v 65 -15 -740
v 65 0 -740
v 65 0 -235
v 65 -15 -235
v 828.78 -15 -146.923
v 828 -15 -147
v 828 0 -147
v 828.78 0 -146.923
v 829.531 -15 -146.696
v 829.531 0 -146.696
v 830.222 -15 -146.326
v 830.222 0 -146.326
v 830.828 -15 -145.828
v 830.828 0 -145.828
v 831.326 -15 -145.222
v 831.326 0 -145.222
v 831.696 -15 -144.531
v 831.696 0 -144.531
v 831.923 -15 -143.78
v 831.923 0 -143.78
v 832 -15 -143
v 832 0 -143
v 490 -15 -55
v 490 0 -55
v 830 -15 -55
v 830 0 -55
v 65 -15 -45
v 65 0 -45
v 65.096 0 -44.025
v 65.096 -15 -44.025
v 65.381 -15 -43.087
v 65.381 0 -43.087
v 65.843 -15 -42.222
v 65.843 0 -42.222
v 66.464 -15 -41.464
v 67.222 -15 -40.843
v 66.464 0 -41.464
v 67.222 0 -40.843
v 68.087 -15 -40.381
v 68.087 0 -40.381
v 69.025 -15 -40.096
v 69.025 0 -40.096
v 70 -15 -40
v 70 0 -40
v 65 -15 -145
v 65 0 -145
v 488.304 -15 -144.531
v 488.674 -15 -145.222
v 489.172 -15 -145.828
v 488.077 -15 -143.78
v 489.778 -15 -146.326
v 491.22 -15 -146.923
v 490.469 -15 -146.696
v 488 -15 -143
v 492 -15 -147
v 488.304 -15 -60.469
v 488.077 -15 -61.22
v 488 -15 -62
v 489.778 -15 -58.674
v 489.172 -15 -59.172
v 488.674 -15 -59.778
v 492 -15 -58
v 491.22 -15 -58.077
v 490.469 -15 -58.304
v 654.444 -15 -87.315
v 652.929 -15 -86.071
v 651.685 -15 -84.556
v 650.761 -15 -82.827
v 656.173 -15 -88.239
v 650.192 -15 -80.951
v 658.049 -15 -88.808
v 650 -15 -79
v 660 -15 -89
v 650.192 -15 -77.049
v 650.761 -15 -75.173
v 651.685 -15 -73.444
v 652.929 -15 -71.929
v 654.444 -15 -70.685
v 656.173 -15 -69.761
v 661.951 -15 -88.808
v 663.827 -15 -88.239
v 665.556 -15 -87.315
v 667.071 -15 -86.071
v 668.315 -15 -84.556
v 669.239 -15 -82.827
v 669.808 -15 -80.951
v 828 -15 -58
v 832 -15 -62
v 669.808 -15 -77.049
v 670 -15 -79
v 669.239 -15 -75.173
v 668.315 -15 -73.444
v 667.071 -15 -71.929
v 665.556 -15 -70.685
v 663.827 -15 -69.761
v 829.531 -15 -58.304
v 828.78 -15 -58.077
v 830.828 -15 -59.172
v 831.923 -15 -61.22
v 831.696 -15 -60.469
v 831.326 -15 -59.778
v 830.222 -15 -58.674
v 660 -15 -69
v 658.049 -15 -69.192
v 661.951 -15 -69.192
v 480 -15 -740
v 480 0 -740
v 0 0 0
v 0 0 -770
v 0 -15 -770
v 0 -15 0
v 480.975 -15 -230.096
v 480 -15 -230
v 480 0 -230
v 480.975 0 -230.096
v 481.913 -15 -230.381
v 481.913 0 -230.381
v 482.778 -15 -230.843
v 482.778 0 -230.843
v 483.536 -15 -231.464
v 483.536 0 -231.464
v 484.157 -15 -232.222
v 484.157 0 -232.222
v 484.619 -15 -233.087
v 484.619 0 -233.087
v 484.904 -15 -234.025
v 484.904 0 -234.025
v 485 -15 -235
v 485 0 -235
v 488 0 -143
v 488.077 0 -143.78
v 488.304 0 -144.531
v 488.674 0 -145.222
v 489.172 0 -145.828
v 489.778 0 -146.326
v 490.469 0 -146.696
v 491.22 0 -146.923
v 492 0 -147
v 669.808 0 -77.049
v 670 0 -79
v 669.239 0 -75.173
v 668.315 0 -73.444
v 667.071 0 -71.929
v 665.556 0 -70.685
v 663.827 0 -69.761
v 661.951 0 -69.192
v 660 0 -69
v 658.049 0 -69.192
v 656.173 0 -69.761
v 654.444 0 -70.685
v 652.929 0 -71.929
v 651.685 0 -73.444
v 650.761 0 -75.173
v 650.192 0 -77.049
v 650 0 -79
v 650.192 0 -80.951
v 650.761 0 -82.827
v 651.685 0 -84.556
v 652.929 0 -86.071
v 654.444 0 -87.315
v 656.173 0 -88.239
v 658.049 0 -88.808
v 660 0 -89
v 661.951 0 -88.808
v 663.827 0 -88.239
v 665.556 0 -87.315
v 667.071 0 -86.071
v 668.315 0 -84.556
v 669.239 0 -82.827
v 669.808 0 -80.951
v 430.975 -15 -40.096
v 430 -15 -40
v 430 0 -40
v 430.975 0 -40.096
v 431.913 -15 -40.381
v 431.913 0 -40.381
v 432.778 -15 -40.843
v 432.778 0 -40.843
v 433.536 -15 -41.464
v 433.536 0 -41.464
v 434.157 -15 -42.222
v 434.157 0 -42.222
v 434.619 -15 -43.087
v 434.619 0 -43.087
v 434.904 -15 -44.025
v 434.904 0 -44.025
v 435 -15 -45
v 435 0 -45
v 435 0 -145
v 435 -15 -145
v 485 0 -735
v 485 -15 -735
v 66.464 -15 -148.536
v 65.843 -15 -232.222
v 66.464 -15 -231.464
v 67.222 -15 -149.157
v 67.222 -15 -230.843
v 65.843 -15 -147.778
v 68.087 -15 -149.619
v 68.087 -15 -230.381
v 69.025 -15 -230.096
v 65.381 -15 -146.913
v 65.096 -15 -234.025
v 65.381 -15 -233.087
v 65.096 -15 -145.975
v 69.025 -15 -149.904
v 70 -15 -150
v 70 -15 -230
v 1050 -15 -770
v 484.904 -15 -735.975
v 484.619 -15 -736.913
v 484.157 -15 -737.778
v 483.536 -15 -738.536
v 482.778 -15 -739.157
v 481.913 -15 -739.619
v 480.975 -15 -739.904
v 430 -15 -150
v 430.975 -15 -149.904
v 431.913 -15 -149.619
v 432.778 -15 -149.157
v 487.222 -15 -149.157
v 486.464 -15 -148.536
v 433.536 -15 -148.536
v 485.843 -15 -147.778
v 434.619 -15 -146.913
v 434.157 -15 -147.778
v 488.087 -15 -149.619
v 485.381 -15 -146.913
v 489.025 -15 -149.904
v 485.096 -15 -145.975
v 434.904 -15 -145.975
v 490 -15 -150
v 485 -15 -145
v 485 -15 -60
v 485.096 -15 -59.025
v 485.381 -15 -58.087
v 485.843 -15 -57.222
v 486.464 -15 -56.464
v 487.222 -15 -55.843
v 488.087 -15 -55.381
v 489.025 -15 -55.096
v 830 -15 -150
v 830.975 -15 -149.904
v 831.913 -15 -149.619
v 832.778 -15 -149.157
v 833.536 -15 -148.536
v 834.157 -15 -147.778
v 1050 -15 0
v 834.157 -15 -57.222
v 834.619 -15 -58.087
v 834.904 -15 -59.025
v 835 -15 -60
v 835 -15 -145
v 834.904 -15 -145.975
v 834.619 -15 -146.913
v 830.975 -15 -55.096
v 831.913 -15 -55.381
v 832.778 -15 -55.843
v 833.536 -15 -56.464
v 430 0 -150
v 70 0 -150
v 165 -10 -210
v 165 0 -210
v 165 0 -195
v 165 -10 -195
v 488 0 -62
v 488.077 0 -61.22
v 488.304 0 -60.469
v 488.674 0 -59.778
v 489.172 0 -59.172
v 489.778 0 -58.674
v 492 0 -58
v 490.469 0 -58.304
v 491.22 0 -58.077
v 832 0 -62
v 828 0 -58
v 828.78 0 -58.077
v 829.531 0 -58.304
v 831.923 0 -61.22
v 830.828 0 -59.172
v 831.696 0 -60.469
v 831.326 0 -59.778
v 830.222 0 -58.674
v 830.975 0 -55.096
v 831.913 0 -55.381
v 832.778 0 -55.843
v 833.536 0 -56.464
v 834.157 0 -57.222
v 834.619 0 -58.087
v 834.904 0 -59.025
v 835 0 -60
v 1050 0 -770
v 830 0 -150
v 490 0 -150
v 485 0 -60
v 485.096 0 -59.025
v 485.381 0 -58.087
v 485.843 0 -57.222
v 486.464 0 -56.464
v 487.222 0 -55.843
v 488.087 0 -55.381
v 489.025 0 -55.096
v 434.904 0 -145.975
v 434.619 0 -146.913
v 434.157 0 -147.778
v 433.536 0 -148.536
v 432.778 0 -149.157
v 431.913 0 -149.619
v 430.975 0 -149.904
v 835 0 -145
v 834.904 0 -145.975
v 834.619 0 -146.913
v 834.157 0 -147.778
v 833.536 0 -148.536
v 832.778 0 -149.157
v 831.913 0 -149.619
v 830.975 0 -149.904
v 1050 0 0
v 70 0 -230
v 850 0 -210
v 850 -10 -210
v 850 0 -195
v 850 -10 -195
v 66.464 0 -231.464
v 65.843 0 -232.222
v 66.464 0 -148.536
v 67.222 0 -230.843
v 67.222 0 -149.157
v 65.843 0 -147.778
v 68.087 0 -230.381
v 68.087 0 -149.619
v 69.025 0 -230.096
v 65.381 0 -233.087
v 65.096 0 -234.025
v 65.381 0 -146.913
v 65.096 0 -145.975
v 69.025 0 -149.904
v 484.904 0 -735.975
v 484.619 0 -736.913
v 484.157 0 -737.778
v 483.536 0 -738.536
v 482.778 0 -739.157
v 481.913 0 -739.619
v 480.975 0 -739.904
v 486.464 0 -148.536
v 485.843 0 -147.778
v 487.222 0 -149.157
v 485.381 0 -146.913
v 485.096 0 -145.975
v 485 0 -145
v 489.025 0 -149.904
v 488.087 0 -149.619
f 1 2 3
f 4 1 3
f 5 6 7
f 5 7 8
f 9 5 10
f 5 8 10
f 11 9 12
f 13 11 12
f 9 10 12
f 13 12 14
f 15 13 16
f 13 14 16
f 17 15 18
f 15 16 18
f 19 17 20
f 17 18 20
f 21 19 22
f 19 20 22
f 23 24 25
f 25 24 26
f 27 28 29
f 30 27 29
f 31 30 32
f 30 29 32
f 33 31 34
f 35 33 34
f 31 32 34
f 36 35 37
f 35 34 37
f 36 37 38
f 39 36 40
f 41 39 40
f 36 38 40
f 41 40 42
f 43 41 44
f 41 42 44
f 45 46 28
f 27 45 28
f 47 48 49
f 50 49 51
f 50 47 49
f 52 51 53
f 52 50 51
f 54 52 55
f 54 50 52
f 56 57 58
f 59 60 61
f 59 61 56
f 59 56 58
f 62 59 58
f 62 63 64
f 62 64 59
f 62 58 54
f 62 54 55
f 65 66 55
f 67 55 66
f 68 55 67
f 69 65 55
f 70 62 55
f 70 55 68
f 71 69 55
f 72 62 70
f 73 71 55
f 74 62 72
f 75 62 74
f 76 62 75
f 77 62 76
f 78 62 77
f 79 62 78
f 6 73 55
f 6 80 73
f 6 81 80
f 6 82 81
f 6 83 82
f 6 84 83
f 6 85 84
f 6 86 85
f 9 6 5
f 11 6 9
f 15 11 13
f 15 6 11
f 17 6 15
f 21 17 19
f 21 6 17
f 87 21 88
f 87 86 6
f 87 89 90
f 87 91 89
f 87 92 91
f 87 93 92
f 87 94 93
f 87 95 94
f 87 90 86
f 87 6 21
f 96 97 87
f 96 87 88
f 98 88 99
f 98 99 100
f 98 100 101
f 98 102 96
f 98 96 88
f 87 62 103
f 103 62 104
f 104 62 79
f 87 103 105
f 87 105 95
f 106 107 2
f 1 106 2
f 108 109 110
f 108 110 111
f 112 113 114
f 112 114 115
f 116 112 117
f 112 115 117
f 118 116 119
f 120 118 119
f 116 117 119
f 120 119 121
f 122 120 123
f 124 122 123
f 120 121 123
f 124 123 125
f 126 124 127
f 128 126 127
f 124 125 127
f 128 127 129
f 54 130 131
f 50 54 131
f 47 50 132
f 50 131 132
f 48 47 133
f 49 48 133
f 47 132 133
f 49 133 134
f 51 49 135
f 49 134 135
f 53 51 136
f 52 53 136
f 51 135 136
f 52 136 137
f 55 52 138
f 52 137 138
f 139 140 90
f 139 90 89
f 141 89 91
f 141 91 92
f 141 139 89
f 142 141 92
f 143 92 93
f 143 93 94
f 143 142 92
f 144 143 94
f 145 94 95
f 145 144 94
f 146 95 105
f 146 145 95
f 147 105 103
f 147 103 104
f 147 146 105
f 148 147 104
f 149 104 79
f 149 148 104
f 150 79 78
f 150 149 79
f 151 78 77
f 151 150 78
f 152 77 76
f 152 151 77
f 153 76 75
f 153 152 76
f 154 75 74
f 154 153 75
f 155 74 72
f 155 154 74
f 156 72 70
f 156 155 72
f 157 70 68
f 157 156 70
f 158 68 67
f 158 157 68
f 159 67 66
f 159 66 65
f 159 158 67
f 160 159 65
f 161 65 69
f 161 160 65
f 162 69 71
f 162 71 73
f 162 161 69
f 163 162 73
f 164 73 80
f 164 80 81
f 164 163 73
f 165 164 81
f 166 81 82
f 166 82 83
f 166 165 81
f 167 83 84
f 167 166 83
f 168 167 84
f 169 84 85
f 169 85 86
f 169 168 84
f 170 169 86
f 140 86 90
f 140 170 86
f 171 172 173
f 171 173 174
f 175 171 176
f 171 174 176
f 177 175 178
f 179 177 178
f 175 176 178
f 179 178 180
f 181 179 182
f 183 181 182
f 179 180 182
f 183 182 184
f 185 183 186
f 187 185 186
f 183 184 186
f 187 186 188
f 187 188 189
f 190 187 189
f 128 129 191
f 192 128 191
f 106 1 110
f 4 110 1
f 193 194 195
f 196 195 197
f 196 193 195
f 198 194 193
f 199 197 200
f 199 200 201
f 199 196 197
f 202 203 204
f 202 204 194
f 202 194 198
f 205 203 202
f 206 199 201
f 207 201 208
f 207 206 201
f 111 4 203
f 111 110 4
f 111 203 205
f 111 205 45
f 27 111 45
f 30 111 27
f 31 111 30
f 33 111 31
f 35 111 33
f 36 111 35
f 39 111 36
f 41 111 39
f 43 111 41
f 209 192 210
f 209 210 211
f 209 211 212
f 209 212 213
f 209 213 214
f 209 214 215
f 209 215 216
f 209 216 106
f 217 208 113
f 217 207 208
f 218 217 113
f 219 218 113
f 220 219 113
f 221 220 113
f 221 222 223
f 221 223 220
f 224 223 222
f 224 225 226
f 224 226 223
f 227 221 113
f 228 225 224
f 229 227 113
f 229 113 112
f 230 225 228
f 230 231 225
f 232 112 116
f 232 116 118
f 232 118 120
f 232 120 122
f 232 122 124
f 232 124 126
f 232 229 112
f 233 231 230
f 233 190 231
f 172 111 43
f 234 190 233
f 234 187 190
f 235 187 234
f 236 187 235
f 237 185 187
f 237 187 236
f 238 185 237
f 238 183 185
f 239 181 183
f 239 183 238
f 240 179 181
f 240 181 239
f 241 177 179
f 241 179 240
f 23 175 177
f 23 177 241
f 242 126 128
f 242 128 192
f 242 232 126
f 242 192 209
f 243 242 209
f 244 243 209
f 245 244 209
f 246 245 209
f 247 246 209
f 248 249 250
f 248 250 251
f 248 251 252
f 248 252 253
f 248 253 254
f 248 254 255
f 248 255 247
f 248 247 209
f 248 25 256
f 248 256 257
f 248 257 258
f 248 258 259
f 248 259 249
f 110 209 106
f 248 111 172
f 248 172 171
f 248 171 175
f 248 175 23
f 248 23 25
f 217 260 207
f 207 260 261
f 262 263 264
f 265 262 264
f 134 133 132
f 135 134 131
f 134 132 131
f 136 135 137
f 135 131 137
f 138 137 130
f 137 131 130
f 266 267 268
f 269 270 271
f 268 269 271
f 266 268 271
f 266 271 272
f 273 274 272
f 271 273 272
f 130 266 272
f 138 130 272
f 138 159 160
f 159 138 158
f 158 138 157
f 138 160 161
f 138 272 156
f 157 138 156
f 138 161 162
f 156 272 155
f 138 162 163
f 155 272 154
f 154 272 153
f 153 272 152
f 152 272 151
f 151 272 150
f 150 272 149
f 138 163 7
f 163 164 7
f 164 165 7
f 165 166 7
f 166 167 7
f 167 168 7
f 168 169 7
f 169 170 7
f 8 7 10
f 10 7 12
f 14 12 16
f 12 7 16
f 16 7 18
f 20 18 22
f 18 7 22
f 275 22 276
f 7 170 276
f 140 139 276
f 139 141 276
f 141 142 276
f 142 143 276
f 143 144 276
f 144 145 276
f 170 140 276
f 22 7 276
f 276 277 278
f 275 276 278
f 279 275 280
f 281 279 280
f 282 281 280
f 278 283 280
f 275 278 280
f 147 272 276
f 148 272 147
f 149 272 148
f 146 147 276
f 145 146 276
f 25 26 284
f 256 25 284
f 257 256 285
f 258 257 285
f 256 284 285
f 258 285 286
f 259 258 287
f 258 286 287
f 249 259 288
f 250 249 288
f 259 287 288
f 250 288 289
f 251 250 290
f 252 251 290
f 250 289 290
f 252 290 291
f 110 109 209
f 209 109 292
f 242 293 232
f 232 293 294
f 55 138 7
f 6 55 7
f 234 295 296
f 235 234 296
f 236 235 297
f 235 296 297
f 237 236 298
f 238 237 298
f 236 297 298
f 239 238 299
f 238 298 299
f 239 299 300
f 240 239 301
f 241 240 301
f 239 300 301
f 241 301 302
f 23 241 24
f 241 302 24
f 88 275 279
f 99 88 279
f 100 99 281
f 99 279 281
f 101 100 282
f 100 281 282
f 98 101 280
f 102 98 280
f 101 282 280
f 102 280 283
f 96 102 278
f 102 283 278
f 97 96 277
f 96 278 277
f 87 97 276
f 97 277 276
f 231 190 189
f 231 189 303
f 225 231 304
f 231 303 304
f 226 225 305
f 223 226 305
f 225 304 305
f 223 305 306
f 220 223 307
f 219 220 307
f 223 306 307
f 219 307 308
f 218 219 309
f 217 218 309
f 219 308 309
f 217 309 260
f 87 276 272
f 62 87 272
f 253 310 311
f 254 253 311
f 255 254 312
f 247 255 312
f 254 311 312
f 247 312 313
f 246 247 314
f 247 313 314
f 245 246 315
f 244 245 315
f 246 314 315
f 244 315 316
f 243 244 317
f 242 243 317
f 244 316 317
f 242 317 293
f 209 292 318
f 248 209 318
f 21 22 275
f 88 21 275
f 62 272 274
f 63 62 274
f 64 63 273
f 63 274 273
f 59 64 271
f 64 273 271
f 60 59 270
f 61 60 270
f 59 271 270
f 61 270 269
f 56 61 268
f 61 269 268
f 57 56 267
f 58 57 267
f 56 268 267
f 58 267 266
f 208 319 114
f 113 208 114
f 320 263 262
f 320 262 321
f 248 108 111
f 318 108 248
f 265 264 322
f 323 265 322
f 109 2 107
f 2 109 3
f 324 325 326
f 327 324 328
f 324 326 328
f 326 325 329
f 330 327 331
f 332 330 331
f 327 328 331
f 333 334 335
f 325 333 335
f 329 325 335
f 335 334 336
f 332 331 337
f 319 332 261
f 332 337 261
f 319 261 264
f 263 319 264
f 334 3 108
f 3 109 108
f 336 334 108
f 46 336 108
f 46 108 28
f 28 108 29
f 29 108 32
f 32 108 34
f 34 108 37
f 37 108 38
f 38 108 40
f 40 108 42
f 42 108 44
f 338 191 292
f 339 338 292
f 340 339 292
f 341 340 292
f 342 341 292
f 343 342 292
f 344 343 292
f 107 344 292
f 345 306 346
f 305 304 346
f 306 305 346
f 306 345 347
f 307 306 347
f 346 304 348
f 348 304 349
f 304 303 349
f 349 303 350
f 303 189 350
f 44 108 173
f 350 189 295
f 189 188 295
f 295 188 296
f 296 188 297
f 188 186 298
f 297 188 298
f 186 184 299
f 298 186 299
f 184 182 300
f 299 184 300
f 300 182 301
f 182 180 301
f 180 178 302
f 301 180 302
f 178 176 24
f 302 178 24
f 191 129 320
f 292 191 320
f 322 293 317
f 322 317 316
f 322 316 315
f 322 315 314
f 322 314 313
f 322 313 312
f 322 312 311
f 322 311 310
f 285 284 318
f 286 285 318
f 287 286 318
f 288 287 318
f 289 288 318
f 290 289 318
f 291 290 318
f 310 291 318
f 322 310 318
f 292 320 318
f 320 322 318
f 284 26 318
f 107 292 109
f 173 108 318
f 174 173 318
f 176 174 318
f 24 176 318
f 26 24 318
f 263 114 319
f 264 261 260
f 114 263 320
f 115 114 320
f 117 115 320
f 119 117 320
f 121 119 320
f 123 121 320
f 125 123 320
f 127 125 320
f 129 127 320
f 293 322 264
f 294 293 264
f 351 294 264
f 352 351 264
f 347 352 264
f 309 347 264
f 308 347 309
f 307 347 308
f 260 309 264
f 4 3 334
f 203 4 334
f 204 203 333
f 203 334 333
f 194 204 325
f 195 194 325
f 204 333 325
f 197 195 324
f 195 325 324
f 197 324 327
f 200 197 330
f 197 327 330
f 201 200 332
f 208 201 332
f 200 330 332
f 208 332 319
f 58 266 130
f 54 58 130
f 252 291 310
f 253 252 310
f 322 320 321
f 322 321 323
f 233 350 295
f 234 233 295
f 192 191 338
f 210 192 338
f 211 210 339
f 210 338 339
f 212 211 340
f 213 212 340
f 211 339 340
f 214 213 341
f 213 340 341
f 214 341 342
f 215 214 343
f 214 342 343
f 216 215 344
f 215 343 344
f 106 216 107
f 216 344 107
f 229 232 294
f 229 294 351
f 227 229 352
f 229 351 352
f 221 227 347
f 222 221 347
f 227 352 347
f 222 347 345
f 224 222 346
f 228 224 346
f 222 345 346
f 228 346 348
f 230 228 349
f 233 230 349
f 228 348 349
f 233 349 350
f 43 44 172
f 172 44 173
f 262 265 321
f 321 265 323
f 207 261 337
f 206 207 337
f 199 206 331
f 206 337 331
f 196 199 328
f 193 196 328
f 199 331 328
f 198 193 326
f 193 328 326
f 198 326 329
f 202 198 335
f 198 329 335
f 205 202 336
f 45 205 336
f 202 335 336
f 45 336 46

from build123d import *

# Parameters (mm, degrees)
F0_R     = 10
F1_DEPTH = 15
F0_W     = 1050
F0_H     = 770
F0_W_2   = 685
F0_H_2   = 15
F2_DEPTH = 10


with BuildPart() as f1:
    # F0 (on Front) → F1 (new body)
    with BuildSketch(Plane.XZ):
        with BuildLine():
            ThreePointArc((488, -143), (489.1715728753, -145.8284271247), (492, -147))
            Line((492, -147), (828, -147))
            ThreePointArc((828, -147), (830.8284271247, -145.8284271247), (832, -143))
            Line((832, -143), (832, -62))
            ThreePointArc((832, -62), (830.8284271247, -59.1715728753), (828, -58))
            Line((828, -58), (492, -58))
            ThreePointArc((492, -58), (489.1715728753, -59.1715728753), (488, -62))
            Line((488, -62), (488, -143))
        make_face()
        with Locations((660, -79)):
            Circle(F0_R, mode=Mode.SUBTRACT)
    extrude(amount=F1_DEPTH)


with BuildPart() as f1b:
    # F0 (on Front) → F1, piece 2 (new body)
    with BuildSketch(Plane.XZ):
        with Locations((525, -385)):
            Rectangle(F0_W, F0_H)
        with BuildLine():
            Line((480, -740), (65, -740))
            Line((65, -740), (65, -235))
            ThreePointArc((65, -235), (66.4644660941, -231.4644660941), (70, -230))
            Line((70, -230), (480, -230))
            ThreePointArc((480, -230), (483.5355339059, -231.4644660941), (485, -235))
            Line((485, -235), (485, -735))
            ThreePointArc((485, -735), (483.5355339059, -738.5355339059), (480, -740))
        make_face(mode=Mode.SUBTRACT)
        with Locations((507.5, -202.5)):
            Rectangle(F0_W_2, F0_H_2, mode=Mode.SUBTRACT)
        with BuildLine():
            ThreePointArc((65, -45), (66.4644660941, -41.4644660941), (70, -40))
            Line((70, -40), (430, -40))
            ThreePointArc((430, -40), (433.5355339059, -41.4644660941), (435, -45))
            Line((435, -45), (435, -145))
            ThreePointArc((435, -145), (433.5355339059, -148.5355339059), (430, -150))
            Line((430, -150), (70, -150))
            ThreePointArc((70, -150), (66.4644660941, -148.5355339059), (65, -145))
            Line((65, -145), (65, -45))
        make_face(mode=Mode.SUBTRACT)
        with BuildLine():
            Line((830, -150), (490, -150))
            ThreePointArc((490, -150), (486.4644660941, -148.5355339059), (485, -145))
            Line((485, -145), (485, -60))
            ThreePointArc((485, -60), (486.4644660941, -56.4644660941), (490, -55))
            Line((490, -55), (830, -55))
            ThreePointArc((830, -55), (833.5355339059, -56.4644660941), (835, -60))
            Line((835, -60), (835, -145))
            ThreePointArc((835, -145), (833.5355339059, -148.5355339059), (830, -150))
        make_face(mode=Mode.SUBTRACT)
        with Locations((507.5, -202.5)):
            Rectangle(F0_W_2, F0_H_2)
    extrude(amount=F1_DEPTH)

    # F0 (on Front) → F2 (cut)
    with BuildSketch(Plane.XZ):
        with Locations((507.5, -202.5)):
            Rectangle(F0_W_2, F0_H_2)
    extrude(amount=F2_DEPTH, mode=Mode.SUBTRACT)


solid = Compound([f1.part, f1b.part])
